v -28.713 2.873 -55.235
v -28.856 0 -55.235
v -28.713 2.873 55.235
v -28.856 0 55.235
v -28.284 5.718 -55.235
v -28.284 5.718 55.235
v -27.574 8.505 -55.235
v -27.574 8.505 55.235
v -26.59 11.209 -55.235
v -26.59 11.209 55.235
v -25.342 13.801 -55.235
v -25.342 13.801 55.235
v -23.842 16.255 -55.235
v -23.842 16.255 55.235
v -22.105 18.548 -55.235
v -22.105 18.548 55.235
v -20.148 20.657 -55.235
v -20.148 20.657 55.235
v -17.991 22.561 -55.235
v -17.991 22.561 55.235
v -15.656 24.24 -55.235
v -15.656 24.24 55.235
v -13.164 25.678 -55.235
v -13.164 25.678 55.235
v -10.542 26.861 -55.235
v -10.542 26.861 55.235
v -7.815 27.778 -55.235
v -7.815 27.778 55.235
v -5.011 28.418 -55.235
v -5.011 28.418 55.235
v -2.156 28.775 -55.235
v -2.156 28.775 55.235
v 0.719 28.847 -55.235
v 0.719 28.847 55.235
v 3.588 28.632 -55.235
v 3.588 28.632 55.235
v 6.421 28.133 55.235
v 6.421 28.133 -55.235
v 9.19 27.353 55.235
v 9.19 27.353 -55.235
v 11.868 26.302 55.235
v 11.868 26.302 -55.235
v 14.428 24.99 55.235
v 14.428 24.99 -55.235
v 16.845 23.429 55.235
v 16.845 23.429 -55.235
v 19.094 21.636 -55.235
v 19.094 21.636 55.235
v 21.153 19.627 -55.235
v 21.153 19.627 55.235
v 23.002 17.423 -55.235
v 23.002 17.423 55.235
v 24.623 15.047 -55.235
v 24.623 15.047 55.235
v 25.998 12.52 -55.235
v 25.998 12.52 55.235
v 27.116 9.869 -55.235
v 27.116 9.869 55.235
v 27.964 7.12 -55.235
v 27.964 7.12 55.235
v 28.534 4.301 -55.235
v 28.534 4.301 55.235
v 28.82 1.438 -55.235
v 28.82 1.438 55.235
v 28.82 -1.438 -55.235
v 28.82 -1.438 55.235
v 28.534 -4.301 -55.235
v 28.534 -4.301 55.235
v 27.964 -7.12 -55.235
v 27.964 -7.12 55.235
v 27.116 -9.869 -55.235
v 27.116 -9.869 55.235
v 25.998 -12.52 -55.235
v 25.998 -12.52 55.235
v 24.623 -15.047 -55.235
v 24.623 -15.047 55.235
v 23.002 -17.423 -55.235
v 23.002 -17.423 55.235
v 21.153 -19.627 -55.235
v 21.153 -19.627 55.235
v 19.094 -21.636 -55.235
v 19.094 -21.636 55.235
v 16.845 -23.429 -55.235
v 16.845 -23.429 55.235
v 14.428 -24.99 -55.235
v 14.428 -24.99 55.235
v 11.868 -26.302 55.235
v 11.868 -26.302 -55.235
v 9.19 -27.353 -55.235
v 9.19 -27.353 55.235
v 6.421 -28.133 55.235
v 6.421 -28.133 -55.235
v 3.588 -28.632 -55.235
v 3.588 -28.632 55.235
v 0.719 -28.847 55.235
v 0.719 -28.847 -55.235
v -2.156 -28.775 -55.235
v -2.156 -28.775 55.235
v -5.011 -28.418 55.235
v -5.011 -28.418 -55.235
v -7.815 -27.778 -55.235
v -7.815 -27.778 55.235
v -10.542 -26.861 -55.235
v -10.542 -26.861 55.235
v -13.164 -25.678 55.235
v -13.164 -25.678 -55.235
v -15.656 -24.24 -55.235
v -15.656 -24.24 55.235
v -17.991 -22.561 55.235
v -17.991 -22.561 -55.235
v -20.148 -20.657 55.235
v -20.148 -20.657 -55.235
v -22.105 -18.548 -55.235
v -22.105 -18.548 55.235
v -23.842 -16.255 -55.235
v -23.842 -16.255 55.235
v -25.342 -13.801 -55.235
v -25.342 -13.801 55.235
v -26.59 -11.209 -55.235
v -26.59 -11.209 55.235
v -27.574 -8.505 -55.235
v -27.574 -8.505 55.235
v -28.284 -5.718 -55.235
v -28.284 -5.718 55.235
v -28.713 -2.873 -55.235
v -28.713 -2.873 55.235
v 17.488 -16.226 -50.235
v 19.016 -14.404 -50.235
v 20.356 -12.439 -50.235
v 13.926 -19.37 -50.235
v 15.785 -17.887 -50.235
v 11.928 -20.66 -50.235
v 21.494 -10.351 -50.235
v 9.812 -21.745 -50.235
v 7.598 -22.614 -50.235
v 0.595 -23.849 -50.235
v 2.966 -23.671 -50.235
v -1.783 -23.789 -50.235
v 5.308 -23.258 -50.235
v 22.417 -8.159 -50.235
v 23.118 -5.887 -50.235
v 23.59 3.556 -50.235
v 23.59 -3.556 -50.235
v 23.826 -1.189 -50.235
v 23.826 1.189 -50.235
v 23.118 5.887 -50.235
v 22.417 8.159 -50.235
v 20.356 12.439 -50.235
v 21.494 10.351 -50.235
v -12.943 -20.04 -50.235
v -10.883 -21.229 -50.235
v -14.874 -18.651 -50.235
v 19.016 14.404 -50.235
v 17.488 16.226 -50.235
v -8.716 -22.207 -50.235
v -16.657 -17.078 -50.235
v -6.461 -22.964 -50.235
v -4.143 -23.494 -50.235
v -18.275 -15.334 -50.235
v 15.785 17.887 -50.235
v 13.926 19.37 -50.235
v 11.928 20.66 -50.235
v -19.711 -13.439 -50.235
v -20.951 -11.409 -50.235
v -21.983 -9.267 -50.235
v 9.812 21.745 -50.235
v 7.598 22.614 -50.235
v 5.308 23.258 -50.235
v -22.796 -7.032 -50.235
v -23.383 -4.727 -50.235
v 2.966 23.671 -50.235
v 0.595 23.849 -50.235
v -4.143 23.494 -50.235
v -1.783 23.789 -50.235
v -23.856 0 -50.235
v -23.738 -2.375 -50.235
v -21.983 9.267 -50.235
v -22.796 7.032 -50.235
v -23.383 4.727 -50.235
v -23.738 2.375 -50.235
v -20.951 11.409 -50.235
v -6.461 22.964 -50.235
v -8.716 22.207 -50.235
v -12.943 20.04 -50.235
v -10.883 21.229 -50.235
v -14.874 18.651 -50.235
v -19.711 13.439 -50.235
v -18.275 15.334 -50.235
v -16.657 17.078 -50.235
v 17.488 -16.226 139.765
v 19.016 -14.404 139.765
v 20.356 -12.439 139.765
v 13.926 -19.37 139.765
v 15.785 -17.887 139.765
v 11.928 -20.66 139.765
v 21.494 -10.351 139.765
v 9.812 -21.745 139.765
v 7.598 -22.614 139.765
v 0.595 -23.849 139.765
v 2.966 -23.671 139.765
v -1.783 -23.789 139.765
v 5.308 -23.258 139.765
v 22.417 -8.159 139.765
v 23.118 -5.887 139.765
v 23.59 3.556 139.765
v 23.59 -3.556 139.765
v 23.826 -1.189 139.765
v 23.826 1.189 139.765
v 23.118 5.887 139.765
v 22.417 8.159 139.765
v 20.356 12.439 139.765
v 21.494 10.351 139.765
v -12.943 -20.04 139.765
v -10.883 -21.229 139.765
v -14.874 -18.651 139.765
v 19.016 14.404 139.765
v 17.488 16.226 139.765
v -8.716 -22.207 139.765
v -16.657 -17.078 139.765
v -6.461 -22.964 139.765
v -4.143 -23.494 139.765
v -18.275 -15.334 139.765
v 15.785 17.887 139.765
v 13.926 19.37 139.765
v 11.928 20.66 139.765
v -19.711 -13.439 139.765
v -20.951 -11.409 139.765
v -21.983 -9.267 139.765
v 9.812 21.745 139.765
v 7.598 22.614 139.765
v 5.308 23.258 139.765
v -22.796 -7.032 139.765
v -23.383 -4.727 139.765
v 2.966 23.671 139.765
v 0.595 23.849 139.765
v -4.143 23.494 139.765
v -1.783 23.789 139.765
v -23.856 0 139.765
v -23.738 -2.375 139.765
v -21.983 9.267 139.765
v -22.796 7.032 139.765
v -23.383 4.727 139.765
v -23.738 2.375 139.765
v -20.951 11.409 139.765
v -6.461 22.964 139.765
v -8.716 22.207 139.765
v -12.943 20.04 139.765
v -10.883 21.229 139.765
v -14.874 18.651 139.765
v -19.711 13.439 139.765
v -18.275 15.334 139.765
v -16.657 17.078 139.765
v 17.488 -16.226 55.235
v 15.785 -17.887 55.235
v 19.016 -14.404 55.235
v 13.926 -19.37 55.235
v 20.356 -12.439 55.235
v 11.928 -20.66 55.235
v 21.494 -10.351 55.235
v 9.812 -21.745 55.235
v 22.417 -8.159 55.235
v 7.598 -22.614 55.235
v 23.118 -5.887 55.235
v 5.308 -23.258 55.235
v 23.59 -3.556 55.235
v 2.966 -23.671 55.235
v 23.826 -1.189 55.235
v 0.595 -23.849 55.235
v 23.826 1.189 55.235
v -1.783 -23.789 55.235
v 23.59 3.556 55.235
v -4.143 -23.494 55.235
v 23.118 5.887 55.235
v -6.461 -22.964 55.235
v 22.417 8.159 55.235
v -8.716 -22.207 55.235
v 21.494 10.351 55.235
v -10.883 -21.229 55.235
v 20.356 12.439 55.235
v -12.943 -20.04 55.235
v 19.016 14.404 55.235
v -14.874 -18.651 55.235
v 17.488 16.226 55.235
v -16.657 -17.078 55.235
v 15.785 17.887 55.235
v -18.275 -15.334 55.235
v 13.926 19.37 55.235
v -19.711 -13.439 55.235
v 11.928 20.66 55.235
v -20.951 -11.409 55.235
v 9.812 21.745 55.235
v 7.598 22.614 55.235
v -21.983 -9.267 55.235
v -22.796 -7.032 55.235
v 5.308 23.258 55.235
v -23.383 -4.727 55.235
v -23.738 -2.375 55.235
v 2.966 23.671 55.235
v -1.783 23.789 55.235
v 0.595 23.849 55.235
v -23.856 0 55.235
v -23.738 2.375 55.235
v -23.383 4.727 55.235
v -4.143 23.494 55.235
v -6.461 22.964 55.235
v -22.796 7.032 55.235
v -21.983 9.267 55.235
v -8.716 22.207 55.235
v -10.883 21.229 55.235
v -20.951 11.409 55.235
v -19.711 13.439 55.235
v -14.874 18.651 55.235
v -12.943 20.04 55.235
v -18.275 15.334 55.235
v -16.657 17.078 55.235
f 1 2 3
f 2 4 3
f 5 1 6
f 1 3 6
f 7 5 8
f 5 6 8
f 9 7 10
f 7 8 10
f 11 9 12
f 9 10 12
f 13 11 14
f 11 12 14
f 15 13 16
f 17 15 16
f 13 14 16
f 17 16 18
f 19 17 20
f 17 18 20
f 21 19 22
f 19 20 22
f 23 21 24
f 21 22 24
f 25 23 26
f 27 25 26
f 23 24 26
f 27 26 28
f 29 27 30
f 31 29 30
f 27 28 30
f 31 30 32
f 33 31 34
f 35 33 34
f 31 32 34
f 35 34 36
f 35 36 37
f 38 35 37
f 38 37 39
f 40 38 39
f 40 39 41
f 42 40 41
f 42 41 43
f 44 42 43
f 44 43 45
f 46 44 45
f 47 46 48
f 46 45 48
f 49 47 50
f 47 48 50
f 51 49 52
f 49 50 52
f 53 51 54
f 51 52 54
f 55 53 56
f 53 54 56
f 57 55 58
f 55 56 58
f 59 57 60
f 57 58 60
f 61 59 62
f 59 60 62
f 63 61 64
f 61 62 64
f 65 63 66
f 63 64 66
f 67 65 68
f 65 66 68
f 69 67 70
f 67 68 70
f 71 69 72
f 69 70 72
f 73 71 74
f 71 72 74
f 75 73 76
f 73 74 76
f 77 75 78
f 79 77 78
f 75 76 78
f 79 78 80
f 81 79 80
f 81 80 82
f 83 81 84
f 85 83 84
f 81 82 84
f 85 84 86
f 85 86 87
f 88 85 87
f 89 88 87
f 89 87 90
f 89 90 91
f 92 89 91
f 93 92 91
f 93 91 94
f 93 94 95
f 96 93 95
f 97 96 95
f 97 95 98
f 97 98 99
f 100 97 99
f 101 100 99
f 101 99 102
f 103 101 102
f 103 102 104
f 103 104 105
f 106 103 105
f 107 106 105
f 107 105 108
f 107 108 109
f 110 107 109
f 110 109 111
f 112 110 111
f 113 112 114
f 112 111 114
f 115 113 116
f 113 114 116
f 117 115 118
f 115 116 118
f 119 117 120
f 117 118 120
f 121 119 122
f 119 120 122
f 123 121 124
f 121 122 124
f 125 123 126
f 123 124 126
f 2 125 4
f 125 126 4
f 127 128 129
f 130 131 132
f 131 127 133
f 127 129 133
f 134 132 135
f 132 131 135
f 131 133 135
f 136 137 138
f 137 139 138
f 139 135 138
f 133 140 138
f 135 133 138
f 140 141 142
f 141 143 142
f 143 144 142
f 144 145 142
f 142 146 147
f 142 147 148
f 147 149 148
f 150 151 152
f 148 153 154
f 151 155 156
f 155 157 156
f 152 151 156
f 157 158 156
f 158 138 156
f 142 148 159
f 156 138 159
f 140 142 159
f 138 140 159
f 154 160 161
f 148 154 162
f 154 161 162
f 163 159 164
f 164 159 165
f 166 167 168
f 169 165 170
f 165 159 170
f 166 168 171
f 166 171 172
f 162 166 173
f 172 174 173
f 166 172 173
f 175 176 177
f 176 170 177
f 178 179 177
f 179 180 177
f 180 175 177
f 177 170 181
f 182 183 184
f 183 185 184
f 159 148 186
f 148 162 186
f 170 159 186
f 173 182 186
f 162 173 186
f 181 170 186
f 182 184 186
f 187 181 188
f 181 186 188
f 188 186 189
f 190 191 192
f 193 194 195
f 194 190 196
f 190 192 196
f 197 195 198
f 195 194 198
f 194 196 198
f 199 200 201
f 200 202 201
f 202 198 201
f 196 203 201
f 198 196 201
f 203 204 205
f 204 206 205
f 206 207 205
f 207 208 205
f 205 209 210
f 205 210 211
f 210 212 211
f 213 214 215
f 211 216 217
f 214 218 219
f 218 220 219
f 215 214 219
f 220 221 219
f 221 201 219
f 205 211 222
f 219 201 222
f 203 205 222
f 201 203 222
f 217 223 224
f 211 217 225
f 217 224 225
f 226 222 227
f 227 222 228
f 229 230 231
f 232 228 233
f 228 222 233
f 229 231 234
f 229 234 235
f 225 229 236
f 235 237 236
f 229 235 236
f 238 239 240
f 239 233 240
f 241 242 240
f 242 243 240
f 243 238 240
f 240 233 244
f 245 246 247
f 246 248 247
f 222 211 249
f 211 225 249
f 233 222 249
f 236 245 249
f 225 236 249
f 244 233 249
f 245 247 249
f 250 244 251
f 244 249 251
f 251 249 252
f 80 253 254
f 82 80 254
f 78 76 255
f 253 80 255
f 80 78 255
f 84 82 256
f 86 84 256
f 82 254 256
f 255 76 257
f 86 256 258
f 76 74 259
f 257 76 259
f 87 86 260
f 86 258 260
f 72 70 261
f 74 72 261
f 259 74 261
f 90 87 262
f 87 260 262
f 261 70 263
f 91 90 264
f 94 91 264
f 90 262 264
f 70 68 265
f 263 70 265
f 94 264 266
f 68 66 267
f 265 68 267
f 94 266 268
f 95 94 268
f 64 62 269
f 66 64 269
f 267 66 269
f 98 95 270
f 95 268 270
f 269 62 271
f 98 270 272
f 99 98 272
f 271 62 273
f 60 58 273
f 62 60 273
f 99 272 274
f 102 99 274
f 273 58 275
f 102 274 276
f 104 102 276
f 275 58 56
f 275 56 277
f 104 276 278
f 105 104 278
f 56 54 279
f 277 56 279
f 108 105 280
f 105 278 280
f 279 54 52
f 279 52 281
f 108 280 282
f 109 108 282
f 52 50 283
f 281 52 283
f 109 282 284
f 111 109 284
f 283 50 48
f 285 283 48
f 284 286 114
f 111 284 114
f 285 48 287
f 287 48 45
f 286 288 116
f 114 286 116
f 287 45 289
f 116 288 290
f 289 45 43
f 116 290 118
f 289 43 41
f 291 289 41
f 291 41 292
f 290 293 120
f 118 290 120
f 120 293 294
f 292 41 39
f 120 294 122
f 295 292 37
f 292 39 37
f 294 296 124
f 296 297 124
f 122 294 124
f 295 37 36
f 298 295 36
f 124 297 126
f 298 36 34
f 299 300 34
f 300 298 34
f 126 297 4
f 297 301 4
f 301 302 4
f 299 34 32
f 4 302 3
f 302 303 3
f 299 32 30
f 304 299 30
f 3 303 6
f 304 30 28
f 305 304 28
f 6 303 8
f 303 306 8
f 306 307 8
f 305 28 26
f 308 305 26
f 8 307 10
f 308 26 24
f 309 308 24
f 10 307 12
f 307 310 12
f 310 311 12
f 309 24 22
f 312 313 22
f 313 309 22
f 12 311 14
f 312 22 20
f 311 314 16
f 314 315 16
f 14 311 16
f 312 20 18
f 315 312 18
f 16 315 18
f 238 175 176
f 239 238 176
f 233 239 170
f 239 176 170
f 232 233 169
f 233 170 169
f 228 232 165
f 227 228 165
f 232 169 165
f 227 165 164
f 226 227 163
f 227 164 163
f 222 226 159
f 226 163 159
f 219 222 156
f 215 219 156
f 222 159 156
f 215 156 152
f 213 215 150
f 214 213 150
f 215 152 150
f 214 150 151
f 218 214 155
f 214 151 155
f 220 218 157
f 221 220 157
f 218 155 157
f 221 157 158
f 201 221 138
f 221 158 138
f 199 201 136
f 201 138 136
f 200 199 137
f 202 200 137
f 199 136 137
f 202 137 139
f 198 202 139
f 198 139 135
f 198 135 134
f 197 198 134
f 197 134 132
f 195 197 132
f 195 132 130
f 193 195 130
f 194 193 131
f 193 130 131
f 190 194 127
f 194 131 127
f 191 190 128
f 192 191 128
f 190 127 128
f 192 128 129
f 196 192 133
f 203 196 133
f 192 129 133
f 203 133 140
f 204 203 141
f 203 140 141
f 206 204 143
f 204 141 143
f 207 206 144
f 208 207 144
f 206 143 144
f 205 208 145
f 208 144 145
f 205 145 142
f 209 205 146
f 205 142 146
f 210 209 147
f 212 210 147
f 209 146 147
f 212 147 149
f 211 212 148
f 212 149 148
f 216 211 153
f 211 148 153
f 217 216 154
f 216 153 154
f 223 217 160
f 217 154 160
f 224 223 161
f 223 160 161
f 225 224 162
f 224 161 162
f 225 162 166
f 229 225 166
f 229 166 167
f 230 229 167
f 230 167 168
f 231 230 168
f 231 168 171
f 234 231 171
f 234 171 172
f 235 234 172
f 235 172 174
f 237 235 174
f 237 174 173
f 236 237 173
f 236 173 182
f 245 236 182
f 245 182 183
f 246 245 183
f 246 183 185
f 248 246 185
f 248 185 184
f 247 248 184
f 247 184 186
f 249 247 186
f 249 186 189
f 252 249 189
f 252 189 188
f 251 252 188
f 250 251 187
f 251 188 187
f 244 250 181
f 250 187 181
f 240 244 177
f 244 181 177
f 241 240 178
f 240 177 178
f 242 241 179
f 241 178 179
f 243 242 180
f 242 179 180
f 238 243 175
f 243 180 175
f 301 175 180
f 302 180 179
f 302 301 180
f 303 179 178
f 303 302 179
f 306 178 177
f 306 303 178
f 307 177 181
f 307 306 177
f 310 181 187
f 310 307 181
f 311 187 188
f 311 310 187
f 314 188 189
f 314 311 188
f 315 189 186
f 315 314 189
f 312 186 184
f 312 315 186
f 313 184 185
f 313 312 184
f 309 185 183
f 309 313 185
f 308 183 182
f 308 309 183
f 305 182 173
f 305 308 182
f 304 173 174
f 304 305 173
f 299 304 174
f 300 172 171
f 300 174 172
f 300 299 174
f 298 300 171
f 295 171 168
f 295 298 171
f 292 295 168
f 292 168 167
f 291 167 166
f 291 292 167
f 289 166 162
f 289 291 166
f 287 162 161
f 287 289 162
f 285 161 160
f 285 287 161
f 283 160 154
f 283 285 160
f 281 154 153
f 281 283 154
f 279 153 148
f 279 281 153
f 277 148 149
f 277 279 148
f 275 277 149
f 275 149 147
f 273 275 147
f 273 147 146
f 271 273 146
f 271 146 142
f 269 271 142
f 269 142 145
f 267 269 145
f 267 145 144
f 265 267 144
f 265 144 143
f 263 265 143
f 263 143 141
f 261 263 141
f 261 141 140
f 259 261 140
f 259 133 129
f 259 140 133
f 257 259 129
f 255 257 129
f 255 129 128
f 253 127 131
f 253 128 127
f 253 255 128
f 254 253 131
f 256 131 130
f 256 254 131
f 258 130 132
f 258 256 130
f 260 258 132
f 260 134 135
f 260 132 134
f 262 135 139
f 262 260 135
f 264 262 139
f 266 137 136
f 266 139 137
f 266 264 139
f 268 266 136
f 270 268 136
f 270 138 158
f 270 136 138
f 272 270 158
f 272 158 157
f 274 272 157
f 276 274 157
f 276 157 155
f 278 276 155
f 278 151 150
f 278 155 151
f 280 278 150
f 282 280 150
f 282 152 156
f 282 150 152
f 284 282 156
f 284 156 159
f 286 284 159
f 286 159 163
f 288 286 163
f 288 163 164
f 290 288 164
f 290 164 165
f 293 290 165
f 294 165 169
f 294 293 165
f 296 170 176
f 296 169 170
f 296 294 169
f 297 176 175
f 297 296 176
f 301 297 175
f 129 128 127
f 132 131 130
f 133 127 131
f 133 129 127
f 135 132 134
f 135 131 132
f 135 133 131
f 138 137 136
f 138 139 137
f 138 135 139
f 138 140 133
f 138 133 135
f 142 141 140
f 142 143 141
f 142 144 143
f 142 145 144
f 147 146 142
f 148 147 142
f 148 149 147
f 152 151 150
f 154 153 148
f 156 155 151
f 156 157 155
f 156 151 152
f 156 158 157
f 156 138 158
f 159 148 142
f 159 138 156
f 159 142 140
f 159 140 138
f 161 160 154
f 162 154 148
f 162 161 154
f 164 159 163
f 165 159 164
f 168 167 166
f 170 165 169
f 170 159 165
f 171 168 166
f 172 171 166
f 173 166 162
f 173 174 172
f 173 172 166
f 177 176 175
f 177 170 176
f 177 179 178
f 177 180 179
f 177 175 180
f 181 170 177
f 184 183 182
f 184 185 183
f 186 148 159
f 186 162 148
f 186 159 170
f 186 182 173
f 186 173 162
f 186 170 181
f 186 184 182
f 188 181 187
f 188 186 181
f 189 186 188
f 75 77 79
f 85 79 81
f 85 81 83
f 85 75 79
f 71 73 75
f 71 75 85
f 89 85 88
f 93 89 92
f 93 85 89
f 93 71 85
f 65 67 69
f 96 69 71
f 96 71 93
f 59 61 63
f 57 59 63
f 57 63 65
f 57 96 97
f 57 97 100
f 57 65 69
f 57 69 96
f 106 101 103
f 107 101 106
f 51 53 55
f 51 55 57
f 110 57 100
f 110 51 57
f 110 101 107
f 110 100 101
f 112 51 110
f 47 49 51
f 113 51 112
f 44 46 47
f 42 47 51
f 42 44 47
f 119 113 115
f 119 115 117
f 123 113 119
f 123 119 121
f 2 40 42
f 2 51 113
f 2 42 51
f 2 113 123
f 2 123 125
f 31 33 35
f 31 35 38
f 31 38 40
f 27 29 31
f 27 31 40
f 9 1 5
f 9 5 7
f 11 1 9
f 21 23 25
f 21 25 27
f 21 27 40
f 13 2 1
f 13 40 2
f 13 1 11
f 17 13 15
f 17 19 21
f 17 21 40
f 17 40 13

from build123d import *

# Parameters (mm, degrees)
F0_W     = 28.8560651243
F0_H     = 110.4691773653
F2_T     = -5
F3_DEPTH = 190


with BuildPart() as f1:
    # F0 (on Front) → F1 (revolve)
    with BuildSketch(Plane.XZ):
        with Locations((-14.4280325621, 0)):
            Rectangle(F0_W, F0_H)
    revolve(axis=Axis((0, 0, 0), (0, 0, -1)))

    # F2
    f2_openings = [f1.faces().sort_by_distance(p)[0] for p in [
        (0, 0, 55.234589),
    ]]
    offset(amount=F2_T, openings=f2_openings)


with BuildPart() as f3:
    # F3 (new): a face of the model
    f3_faces = [f1.part.faces().sort_by_distance(p)[0] for p in [
        (0, 0, -50.2345886827),
    ]]
    extrude(f3_faces, amount=F3_DEPTH)


solid = Compound([f1.part, f3.part])
